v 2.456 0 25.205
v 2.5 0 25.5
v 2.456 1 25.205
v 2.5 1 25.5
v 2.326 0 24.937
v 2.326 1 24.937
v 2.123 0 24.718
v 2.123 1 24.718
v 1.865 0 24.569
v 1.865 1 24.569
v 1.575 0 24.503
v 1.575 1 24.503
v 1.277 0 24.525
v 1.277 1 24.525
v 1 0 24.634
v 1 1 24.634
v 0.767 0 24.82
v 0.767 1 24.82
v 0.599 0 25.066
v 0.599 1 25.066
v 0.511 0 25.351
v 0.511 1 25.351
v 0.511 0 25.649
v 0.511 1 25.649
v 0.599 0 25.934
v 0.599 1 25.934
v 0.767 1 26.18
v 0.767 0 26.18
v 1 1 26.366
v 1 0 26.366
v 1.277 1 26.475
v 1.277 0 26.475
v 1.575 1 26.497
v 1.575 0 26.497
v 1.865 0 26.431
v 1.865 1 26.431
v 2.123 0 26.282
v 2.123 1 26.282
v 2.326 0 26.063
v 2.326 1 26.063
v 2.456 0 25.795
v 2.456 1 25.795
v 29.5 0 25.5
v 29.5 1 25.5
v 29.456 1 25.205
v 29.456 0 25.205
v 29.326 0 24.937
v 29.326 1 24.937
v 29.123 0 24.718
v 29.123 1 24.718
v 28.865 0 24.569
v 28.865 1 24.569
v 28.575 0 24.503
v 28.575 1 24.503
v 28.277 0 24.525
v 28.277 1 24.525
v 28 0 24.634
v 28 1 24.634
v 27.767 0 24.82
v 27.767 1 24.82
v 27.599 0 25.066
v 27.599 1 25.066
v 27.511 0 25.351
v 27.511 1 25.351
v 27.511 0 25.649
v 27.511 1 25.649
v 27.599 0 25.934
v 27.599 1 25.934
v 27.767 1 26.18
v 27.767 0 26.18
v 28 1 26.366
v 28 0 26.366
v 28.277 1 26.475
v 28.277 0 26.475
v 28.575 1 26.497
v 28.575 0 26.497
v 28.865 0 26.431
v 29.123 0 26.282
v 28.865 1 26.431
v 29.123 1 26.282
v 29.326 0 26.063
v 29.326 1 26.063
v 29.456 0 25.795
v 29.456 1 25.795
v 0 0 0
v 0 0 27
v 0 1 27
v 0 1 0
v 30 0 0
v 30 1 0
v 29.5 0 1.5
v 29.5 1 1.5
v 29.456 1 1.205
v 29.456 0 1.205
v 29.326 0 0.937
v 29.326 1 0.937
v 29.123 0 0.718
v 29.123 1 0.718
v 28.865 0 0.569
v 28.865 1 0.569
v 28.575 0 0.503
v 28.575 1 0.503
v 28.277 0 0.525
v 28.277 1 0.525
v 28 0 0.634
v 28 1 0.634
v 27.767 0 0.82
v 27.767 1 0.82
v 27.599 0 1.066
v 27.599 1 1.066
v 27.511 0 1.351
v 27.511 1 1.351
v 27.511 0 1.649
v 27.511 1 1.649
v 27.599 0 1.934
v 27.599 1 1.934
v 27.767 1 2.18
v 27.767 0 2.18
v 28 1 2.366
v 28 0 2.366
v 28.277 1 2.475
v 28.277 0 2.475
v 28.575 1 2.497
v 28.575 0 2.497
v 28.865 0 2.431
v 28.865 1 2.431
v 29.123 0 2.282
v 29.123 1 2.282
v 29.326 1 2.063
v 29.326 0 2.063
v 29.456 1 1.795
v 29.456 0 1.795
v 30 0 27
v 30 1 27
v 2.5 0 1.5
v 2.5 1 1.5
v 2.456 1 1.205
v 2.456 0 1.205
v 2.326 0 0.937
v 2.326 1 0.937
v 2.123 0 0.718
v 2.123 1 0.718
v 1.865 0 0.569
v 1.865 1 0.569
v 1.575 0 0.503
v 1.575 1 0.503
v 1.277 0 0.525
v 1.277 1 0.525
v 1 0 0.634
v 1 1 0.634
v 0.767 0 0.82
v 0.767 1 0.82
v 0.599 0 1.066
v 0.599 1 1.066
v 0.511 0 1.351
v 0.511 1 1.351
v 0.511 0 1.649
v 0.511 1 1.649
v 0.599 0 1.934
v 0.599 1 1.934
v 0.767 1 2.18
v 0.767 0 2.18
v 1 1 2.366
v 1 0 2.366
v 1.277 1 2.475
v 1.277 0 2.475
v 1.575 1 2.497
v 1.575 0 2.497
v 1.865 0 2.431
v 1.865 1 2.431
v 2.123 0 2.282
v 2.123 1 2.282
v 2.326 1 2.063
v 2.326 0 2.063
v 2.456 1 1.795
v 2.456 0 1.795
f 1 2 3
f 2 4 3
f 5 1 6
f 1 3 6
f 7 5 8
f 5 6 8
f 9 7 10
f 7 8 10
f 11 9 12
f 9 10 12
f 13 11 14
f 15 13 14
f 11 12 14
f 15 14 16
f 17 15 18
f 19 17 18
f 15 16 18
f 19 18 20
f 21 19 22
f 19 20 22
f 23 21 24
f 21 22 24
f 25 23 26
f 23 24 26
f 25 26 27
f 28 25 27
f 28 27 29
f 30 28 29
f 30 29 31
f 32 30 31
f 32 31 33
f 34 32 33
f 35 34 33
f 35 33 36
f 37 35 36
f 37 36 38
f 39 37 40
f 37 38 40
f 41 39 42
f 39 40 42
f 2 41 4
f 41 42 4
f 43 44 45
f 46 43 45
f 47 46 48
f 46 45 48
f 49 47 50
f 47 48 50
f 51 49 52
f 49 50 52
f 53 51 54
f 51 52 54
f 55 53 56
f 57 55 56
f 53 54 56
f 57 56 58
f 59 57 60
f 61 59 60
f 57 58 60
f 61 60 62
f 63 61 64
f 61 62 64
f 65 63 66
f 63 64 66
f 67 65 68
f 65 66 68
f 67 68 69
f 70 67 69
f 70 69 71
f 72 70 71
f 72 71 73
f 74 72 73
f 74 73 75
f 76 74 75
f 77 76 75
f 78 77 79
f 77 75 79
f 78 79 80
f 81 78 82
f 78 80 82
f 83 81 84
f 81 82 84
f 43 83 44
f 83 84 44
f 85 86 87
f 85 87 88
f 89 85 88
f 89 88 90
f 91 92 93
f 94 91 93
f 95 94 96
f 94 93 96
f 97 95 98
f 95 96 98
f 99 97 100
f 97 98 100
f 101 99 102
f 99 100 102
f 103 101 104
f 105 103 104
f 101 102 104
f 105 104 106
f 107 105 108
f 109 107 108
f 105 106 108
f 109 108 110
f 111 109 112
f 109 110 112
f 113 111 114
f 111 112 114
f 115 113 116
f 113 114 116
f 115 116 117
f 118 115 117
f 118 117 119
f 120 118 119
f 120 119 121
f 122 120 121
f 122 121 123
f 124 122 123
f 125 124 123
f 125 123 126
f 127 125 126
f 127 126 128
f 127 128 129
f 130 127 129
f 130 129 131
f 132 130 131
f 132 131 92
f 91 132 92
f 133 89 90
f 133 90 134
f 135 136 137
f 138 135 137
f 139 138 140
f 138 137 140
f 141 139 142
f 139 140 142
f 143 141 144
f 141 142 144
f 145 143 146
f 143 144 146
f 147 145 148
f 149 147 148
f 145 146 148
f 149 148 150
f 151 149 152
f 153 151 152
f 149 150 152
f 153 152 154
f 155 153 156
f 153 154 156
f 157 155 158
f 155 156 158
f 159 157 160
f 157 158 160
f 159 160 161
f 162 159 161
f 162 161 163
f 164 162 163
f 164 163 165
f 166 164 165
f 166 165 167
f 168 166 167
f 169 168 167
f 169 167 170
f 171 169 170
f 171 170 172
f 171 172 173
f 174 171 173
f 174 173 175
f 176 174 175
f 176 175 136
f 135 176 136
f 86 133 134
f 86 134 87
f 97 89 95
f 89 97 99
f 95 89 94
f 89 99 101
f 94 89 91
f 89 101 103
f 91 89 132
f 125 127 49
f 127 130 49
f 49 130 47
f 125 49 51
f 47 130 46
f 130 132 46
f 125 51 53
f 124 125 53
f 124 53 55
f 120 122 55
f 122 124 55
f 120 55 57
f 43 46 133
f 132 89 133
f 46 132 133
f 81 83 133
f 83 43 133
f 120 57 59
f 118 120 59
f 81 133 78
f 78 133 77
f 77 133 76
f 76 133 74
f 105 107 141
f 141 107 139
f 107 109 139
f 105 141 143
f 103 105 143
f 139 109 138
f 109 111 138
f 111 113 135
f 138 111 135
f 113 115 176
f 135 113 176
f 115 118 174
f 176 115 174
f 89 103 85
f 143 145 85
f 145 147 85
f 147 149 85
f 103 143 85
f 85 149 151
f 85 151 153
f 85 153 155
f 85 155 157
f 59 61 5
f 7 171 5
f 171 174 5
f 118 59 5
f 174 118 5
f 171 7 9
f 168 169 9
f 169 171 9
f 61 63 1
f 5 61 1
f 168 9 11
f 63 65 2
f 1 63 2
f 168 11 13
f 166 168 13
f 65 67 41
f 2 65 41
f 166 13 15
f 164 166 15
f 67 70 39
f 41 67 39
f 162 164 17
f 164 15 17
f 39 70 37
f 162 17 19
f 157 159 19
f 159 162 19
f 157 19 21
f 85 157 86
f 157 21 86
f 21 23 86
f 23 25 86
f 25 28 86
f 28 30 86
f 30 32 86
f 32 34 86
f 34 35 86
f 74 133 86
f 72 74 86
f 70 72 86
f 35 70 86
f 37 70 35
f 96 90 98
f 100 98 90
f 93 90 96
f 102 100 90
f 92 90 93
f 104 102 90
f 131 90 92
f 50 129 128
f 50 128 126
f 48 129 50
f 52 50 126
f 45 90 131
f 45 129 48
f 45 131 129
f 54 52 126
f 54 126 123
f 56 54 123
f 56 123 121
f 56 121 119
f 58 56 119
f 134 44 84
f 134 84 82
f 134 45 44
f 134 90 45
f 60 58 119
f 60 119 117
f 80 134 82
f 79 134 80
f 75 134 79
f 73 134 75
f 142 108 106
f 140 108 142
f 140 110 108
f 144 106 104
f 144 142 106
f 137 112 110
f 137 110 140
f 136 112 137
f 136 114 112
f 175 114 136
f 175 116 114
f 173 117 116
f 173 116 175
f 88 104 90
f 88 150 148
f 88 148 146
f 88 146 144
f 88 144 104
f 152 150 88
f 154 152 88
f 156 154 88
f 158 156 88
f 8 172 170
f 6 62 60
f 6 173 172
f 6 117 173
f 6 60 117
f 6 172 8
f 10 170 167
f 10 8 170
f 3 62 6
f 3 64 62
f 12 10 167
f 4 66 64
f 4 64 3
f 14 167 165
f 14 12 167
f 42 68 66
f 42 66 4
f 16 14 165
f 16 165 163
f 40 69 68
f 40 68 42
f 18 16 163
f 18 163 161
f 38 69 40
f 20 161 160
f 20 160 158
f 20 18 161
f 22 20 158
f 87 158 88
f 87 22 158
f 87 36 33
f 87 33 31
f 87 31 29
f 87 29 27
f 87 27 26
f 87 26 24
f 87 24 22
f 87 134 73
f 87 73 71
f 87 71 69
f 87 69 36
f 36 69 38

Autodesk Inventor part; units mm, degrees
ref_plane "YZ Plane" through (0, 0, 0) normal (1, 0, 0) x (0, 1, 0)
ref_plane "XZ Plane" through (0, 0, 0) normal (0, 1, 0) x (-1, 0, 0)
ref_plane "XY Plane" through (0, 0, 0) normal (0, 0, 1) x (1, 0, 0)
sketch "Sketch1" plane through (0, 0, 0) normal (0, 1, 0) x (-1, 0, 0)
  line L0 (0, 0) -> (-30, 0)
  line L1 (-30, 0) -> (-30, 27)
  line L2 (-30, 27) -> (0, 27)
  line L3 (0, 27) -> (0, 0)
  dimension "d0" = 30
  dimension "d1" = 27
extrude "Extrusion1" add sketch "Sketch1" along normal blind 1
sketch "Sketch2" plane through (0, 1, 0) normal (0, 1, 0) x (1, 0, 0)
  line L0 (30, 0) -> (0, 0) projected
  line L1 (0, 0) -> (0, -27) projected
  line L2 (0, -27) -> (30, -27) projected
  line L3 (30, -27) -> (30, 0) projected
  line L4 (1.5, -25.5) -> (1.5, -1.5)
  line L5 (1.5, -1.5) -> (28.5, -1.5)
  line L6 (28.5, -1.5) -> (28.5, -25.5)
  line L7 (28.5, -25.5) -> (1.5, -25.5)
  circle A0 centre (1.5, -25.5) radius 1
  circle A1 centre (28.5, -25.5) radius 1
  circle A2 centre (1.5, -1.5) radius 1
  circle A3 centre (28.5, -1.5) radius 1
  dimension "d4" = 1.5
  dimension "d5" = 2
  dimension "d6" = 2
  dimension "d7" = 2
  dimension "d8" = 2
extrude "Extrusion2" cut sketch "Sketch2" against normal through all contours L7 A0 L4 | L4 A0 L7 | A2 L5 L4 | L4 L5 A2 | A1 L6 L7 | L7 L6 A1 | A3 L6 L5 | L5 L6 A3
properties part number "00_motordriver_pcb"
